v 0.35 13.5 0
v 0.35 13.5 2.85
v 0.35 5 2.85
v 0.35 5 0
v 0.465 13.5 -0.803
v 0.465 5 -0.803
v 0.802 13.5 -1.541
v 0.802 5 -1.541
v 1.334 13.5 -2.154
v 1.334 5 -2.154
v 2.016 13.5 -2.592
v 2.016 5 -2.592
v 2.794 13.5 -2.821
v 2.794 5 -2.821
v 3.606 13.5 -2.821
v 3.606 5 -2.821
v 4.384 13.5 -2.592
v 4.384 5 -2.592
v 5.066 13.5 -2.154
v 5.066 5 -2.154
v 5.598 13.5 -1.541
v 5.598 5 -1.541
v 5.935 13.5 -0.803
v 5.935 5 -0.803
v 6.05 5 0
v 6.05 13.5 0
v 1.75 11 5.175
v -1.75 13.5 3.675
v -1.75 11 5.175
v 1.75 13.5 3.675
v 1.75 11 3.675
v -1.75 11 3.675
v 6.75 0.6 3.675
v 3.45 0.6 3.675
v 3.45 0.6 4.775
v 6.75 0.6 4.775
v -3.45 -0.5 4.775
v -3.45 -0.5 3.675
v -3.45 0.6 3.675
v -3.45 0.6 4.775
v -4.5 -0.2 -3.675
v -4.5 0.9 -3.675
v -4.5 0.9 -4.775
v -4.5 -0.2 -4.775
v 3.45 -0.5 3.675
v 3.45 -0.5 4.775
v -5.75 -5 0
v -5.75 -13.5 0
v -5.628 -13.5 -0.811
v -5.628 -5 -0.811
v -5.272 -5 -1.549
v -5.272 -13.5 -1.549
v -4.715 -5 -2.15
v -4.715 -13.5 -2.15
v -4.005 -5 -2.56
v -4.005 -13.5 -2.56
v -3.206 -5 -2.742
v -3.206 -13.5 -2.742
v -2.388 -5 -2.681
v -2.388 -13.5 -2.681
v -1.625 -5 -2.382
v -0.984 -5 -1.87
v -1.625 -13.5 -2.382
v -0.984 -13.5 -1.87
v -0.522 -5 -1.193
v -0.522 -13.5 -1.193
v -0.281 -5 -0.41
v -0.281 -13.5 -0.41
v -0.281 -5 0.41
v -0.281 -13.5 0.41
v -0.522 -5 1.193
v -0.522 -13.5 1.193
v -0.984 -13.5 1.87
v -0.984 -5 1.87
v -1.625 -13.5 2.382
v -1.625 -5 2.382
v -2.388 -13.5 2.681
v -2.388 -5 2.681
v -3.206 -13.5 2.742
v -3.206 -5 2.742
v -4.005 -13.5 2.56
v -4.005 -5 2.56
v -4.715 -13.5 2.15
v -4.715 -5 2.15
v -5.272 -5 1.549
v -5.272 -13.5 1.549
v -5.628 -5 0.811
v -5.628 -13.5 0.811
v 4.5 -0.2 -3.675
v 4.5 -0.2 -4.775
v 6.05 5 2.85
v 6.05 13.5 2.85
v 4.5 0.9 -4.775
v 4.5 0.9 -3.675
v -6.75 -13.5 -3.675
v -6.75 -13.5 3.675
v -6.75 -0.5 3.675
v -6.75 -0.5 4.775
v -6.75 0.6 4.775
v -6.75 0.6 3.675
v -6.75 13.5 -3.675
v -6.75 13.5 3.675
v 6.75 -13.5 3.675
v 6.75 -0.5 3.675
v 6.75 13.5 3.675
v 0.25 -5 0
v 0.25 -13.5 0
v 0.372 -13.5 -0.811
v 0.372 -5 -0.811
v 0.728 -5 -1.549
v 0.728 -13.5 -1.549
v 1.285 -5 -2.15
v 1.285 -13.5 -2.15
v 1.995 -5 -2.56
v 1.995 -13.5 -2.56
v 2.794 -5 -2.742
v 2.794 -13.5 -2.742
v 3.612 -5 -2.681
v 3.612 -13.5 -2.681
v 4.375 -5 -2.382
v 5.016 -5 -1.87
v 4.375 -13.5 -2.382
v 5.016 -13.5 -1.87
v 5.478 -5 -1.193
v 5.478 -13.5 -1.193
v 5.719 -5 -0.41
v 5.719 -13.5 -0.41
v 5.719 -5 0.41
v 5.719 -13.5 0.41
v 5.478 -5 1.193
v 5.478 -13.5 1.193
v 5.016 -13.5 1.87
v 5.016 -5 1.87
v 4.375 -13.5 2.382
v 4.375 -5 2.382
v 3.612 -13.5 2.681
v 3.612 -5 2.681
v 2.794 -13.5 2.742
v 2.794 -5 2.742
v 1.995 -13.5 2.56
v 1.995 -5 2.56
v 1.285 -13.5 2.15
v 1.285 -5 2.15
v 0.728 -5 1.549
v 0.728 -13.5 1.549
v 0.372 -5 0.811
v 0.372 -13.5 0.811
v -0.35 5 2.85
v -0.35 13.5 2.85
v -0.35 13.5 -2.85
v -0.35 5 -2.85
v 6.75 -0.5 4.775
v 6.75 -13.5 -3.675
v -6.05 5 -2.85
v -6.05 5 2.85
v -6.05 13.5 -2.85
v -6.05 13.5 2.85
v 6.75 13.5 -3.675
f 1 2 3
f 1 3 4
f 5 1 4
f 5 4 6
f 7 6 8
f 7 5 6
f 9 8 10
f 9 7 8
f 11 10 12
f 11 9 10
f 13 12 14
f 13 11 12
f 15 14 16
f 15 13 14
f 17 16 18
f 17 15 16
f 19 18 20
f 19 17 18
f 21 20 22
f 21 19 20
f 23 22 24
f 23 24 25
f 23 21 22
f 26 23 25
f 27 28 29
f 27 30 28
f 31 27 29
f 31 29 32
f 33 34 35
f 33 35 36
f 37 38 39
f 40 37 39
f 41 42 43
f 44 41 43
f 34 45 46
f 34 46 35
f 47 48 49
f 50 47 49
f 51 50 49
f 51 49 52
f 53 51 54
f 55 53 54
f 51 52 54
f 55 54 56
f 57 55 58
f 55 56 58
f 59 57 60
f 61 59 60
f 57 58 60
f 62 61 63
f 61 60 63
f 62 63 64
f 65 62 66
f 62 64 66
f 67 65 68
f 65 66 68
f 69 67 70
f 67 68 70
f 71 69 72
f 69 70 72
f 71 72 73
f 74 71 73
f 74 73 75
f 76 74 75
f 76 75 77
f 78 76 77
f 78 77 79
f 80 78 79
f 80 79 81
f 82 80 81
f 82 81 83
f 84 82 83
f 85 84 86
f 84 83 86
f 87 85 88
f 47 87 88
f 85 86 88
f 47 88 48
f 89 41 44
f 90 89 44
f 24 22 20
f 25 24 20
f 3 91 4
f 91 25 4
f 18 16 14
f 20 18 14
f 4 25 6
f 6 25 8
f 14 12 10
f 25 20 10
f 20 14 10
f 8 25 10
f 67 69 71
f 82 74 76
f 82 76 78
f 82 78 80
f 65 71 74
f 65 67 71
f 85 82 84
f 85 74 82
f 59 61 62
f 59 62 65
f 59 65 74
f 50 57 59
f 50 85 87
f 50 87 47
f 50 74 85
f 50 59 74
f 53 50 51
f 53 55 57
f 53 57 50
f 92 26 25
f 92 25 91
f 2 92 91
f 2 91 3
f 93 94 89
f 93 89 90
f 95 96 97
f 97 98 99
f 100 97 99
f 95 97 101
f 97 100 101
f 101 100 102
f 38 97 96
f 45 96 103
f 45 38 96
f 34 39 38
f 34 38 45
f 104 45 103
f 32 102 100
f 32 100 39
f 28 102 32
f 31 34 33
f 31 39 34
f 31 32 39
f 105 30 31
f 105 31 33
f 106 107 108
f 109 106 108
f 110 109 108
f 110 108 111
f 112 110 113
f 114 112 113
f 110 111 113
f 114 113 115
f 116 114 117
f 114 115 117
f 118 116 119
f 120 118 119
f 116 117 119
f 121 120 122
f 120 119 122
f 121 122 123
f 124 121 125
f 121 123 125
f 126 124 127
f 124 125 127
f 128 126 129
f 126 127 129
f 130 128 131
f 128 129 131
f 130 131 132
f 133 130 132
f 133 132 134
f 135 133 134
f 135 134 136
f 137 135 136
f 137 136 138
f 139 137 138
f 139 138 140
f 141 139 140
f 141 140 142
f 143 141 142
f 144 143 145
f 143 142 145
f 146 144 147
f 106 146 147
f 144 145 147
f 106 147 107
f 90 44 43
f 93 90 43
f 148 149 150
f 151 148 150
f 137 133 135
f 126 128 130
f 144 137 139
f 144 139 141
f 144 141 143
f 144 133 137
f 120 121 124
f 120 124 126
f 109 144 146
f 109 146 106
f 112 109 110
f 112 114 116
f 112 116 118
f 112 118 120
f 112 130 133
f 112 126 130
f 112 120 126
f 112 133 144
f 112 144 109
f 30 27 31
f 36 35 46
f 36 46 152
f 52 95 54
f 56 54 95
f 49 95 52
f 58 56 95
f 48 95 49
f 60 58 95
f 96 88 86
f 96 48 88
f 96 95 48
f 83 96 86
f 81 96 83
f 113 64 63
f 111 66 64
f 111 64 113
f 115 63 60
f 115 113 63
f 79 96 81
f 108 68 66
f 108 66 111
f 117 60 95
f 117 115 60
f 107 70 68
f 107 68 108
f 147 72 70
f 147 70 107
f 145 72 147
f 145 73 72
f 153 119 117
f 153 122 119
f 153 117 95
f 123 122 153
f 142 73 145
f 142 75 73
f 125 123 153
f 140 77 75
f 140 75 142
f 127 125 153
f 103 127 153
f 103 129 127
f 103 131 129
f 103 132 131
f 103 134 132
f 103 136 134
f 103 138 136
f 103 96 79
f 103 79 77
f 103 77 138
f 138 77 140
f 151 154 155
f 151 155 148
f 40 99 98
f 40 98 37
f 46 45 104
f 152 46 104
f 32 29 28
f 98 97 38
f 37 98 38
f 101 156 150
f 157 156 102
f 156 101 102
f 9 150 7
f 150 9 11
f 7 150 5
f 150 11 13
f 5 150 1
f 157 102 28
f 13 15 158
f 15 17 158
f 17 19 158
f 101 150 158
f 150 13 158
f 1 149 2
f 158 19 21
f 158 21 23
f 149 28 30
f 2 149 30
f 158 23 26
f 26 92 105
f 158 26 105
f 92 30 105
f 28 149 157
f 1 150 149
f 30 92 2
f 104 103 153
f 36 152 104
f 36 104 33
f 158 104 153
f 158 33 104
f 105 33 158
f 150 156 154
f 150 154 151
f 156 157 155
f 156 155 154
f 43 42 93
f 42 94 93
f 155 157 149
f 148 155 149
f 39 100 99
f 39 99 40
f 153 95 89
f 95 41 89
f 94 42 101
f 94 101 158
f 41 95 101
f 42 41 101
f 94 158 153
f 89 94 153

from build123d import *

# Parameters (mm, degrees)
SKETCH1_W                = 13.5
SKETCH1_H                = 27
MAIN_DEPTH               = 3.675
SKETCH2_R                = 2.75
BACKCABLEHOLE_DEPTH      = 8.5
SKETCH3_W                = 5.7
SKETCH3_H                = 5.7
FRONTCONNECTORHOLE_DEPTH = 8.5
MAINHOOK_DEPTH           = 1.75
SKETCH5_W                = 1.1
SKETCH5_H                = 1.1
BOTTOMLINE_DEPTH         = 4.5
SKETCH6_W                = 3.3
SKETCH6_H                = 1.1
SIDEHOOK_DEPTH           = 1.1


with BuildPart() as part:
    # Sketch1 → Main (new body, symmetric)
    with BuildSketch(Plane.XY):
        Rectangle(SKETCH1_W, SKETCH1_H)
    extrude(amount=MAIN_DEPTH, both=True)

    # Sketch2 → BackCableHole (cut)
    with BuildSketch(Plane(origin=(0, -13.5, 0), x_dir=(-1, 0, 0), z_dir=(0, -1, 0))):
        with Locations((3, 0)):
            Circle(SKETCH2_R)
        with Locations((-3, 0)):
            Circle(SKETCH2_R)
    extrude(amount=-BACKCABLEHOLE_DEPTH, mode=Mode.SUBTRACT)

    # Sketch3 → FrontConnectorHole (cut)
    with BuildSketch(Plane(origin=(0, 13.5, 0), x_dir=(1, 0, 0), z_dir=(0, 1, 0))):
        with Locations((-3.2, 0)):
            Rectangle(SKETCH3_W, SKETCH3_H)
        with BuildLine():
            Line((6.05, -2.85), (0.35, -2.85))
            Line((0.35, -2.85), (0.35, 0))
            ThreePointArc((0.35, 0), (3.2, 2.85), (6.05, 0))
            Line((6.05, 0), (6.05, -2.85))
        make_face()
    extrude(amount=-FRONTCONNECTORHOLE_DEPTH, mode=Mode.SUBTRACT)

    # Sketch4 → MainHook (add, symmetric)
    with BuildSketch(Plane(origin=(0, 0, 0), x_dir=(0, 0, -1), z_dir=(1, 0, 0))):
        Polygon((-3.675, 13.5), (-5.175, 11), (-3.675, 11), align=None)
    extrude(amount=MAINHOOK_DEPTH, both=True)

    # Sketch5 → BottomLine (add, symmetric)
    with BuildSketch(Plane(origin=(0, 0, 0), x_dir=(0, 0, -1), z_dir=(1, 0, 0))):
        with Locations((4.225, 0.35)):
            Rectangle(SKETCH5_W, SKETCH5_H)
    extrude(amount=BOTTOMLINE_DEPTH, both=True)

    # Sketch6 → SideHook (add)
    with BuildSketch(Plane.XY.offset(3.675)):
        with Locations((-5.1, 0.05)):
            Rectangle(SKETCH6_W, SKETCH6_H)
        with Locations((5.1, 0.05)):
            Rectangle(SKETCH6_W, SKETCH6_H)
    extrude(amount=SIDEHOOK_DEPTH)


solid = part.part
